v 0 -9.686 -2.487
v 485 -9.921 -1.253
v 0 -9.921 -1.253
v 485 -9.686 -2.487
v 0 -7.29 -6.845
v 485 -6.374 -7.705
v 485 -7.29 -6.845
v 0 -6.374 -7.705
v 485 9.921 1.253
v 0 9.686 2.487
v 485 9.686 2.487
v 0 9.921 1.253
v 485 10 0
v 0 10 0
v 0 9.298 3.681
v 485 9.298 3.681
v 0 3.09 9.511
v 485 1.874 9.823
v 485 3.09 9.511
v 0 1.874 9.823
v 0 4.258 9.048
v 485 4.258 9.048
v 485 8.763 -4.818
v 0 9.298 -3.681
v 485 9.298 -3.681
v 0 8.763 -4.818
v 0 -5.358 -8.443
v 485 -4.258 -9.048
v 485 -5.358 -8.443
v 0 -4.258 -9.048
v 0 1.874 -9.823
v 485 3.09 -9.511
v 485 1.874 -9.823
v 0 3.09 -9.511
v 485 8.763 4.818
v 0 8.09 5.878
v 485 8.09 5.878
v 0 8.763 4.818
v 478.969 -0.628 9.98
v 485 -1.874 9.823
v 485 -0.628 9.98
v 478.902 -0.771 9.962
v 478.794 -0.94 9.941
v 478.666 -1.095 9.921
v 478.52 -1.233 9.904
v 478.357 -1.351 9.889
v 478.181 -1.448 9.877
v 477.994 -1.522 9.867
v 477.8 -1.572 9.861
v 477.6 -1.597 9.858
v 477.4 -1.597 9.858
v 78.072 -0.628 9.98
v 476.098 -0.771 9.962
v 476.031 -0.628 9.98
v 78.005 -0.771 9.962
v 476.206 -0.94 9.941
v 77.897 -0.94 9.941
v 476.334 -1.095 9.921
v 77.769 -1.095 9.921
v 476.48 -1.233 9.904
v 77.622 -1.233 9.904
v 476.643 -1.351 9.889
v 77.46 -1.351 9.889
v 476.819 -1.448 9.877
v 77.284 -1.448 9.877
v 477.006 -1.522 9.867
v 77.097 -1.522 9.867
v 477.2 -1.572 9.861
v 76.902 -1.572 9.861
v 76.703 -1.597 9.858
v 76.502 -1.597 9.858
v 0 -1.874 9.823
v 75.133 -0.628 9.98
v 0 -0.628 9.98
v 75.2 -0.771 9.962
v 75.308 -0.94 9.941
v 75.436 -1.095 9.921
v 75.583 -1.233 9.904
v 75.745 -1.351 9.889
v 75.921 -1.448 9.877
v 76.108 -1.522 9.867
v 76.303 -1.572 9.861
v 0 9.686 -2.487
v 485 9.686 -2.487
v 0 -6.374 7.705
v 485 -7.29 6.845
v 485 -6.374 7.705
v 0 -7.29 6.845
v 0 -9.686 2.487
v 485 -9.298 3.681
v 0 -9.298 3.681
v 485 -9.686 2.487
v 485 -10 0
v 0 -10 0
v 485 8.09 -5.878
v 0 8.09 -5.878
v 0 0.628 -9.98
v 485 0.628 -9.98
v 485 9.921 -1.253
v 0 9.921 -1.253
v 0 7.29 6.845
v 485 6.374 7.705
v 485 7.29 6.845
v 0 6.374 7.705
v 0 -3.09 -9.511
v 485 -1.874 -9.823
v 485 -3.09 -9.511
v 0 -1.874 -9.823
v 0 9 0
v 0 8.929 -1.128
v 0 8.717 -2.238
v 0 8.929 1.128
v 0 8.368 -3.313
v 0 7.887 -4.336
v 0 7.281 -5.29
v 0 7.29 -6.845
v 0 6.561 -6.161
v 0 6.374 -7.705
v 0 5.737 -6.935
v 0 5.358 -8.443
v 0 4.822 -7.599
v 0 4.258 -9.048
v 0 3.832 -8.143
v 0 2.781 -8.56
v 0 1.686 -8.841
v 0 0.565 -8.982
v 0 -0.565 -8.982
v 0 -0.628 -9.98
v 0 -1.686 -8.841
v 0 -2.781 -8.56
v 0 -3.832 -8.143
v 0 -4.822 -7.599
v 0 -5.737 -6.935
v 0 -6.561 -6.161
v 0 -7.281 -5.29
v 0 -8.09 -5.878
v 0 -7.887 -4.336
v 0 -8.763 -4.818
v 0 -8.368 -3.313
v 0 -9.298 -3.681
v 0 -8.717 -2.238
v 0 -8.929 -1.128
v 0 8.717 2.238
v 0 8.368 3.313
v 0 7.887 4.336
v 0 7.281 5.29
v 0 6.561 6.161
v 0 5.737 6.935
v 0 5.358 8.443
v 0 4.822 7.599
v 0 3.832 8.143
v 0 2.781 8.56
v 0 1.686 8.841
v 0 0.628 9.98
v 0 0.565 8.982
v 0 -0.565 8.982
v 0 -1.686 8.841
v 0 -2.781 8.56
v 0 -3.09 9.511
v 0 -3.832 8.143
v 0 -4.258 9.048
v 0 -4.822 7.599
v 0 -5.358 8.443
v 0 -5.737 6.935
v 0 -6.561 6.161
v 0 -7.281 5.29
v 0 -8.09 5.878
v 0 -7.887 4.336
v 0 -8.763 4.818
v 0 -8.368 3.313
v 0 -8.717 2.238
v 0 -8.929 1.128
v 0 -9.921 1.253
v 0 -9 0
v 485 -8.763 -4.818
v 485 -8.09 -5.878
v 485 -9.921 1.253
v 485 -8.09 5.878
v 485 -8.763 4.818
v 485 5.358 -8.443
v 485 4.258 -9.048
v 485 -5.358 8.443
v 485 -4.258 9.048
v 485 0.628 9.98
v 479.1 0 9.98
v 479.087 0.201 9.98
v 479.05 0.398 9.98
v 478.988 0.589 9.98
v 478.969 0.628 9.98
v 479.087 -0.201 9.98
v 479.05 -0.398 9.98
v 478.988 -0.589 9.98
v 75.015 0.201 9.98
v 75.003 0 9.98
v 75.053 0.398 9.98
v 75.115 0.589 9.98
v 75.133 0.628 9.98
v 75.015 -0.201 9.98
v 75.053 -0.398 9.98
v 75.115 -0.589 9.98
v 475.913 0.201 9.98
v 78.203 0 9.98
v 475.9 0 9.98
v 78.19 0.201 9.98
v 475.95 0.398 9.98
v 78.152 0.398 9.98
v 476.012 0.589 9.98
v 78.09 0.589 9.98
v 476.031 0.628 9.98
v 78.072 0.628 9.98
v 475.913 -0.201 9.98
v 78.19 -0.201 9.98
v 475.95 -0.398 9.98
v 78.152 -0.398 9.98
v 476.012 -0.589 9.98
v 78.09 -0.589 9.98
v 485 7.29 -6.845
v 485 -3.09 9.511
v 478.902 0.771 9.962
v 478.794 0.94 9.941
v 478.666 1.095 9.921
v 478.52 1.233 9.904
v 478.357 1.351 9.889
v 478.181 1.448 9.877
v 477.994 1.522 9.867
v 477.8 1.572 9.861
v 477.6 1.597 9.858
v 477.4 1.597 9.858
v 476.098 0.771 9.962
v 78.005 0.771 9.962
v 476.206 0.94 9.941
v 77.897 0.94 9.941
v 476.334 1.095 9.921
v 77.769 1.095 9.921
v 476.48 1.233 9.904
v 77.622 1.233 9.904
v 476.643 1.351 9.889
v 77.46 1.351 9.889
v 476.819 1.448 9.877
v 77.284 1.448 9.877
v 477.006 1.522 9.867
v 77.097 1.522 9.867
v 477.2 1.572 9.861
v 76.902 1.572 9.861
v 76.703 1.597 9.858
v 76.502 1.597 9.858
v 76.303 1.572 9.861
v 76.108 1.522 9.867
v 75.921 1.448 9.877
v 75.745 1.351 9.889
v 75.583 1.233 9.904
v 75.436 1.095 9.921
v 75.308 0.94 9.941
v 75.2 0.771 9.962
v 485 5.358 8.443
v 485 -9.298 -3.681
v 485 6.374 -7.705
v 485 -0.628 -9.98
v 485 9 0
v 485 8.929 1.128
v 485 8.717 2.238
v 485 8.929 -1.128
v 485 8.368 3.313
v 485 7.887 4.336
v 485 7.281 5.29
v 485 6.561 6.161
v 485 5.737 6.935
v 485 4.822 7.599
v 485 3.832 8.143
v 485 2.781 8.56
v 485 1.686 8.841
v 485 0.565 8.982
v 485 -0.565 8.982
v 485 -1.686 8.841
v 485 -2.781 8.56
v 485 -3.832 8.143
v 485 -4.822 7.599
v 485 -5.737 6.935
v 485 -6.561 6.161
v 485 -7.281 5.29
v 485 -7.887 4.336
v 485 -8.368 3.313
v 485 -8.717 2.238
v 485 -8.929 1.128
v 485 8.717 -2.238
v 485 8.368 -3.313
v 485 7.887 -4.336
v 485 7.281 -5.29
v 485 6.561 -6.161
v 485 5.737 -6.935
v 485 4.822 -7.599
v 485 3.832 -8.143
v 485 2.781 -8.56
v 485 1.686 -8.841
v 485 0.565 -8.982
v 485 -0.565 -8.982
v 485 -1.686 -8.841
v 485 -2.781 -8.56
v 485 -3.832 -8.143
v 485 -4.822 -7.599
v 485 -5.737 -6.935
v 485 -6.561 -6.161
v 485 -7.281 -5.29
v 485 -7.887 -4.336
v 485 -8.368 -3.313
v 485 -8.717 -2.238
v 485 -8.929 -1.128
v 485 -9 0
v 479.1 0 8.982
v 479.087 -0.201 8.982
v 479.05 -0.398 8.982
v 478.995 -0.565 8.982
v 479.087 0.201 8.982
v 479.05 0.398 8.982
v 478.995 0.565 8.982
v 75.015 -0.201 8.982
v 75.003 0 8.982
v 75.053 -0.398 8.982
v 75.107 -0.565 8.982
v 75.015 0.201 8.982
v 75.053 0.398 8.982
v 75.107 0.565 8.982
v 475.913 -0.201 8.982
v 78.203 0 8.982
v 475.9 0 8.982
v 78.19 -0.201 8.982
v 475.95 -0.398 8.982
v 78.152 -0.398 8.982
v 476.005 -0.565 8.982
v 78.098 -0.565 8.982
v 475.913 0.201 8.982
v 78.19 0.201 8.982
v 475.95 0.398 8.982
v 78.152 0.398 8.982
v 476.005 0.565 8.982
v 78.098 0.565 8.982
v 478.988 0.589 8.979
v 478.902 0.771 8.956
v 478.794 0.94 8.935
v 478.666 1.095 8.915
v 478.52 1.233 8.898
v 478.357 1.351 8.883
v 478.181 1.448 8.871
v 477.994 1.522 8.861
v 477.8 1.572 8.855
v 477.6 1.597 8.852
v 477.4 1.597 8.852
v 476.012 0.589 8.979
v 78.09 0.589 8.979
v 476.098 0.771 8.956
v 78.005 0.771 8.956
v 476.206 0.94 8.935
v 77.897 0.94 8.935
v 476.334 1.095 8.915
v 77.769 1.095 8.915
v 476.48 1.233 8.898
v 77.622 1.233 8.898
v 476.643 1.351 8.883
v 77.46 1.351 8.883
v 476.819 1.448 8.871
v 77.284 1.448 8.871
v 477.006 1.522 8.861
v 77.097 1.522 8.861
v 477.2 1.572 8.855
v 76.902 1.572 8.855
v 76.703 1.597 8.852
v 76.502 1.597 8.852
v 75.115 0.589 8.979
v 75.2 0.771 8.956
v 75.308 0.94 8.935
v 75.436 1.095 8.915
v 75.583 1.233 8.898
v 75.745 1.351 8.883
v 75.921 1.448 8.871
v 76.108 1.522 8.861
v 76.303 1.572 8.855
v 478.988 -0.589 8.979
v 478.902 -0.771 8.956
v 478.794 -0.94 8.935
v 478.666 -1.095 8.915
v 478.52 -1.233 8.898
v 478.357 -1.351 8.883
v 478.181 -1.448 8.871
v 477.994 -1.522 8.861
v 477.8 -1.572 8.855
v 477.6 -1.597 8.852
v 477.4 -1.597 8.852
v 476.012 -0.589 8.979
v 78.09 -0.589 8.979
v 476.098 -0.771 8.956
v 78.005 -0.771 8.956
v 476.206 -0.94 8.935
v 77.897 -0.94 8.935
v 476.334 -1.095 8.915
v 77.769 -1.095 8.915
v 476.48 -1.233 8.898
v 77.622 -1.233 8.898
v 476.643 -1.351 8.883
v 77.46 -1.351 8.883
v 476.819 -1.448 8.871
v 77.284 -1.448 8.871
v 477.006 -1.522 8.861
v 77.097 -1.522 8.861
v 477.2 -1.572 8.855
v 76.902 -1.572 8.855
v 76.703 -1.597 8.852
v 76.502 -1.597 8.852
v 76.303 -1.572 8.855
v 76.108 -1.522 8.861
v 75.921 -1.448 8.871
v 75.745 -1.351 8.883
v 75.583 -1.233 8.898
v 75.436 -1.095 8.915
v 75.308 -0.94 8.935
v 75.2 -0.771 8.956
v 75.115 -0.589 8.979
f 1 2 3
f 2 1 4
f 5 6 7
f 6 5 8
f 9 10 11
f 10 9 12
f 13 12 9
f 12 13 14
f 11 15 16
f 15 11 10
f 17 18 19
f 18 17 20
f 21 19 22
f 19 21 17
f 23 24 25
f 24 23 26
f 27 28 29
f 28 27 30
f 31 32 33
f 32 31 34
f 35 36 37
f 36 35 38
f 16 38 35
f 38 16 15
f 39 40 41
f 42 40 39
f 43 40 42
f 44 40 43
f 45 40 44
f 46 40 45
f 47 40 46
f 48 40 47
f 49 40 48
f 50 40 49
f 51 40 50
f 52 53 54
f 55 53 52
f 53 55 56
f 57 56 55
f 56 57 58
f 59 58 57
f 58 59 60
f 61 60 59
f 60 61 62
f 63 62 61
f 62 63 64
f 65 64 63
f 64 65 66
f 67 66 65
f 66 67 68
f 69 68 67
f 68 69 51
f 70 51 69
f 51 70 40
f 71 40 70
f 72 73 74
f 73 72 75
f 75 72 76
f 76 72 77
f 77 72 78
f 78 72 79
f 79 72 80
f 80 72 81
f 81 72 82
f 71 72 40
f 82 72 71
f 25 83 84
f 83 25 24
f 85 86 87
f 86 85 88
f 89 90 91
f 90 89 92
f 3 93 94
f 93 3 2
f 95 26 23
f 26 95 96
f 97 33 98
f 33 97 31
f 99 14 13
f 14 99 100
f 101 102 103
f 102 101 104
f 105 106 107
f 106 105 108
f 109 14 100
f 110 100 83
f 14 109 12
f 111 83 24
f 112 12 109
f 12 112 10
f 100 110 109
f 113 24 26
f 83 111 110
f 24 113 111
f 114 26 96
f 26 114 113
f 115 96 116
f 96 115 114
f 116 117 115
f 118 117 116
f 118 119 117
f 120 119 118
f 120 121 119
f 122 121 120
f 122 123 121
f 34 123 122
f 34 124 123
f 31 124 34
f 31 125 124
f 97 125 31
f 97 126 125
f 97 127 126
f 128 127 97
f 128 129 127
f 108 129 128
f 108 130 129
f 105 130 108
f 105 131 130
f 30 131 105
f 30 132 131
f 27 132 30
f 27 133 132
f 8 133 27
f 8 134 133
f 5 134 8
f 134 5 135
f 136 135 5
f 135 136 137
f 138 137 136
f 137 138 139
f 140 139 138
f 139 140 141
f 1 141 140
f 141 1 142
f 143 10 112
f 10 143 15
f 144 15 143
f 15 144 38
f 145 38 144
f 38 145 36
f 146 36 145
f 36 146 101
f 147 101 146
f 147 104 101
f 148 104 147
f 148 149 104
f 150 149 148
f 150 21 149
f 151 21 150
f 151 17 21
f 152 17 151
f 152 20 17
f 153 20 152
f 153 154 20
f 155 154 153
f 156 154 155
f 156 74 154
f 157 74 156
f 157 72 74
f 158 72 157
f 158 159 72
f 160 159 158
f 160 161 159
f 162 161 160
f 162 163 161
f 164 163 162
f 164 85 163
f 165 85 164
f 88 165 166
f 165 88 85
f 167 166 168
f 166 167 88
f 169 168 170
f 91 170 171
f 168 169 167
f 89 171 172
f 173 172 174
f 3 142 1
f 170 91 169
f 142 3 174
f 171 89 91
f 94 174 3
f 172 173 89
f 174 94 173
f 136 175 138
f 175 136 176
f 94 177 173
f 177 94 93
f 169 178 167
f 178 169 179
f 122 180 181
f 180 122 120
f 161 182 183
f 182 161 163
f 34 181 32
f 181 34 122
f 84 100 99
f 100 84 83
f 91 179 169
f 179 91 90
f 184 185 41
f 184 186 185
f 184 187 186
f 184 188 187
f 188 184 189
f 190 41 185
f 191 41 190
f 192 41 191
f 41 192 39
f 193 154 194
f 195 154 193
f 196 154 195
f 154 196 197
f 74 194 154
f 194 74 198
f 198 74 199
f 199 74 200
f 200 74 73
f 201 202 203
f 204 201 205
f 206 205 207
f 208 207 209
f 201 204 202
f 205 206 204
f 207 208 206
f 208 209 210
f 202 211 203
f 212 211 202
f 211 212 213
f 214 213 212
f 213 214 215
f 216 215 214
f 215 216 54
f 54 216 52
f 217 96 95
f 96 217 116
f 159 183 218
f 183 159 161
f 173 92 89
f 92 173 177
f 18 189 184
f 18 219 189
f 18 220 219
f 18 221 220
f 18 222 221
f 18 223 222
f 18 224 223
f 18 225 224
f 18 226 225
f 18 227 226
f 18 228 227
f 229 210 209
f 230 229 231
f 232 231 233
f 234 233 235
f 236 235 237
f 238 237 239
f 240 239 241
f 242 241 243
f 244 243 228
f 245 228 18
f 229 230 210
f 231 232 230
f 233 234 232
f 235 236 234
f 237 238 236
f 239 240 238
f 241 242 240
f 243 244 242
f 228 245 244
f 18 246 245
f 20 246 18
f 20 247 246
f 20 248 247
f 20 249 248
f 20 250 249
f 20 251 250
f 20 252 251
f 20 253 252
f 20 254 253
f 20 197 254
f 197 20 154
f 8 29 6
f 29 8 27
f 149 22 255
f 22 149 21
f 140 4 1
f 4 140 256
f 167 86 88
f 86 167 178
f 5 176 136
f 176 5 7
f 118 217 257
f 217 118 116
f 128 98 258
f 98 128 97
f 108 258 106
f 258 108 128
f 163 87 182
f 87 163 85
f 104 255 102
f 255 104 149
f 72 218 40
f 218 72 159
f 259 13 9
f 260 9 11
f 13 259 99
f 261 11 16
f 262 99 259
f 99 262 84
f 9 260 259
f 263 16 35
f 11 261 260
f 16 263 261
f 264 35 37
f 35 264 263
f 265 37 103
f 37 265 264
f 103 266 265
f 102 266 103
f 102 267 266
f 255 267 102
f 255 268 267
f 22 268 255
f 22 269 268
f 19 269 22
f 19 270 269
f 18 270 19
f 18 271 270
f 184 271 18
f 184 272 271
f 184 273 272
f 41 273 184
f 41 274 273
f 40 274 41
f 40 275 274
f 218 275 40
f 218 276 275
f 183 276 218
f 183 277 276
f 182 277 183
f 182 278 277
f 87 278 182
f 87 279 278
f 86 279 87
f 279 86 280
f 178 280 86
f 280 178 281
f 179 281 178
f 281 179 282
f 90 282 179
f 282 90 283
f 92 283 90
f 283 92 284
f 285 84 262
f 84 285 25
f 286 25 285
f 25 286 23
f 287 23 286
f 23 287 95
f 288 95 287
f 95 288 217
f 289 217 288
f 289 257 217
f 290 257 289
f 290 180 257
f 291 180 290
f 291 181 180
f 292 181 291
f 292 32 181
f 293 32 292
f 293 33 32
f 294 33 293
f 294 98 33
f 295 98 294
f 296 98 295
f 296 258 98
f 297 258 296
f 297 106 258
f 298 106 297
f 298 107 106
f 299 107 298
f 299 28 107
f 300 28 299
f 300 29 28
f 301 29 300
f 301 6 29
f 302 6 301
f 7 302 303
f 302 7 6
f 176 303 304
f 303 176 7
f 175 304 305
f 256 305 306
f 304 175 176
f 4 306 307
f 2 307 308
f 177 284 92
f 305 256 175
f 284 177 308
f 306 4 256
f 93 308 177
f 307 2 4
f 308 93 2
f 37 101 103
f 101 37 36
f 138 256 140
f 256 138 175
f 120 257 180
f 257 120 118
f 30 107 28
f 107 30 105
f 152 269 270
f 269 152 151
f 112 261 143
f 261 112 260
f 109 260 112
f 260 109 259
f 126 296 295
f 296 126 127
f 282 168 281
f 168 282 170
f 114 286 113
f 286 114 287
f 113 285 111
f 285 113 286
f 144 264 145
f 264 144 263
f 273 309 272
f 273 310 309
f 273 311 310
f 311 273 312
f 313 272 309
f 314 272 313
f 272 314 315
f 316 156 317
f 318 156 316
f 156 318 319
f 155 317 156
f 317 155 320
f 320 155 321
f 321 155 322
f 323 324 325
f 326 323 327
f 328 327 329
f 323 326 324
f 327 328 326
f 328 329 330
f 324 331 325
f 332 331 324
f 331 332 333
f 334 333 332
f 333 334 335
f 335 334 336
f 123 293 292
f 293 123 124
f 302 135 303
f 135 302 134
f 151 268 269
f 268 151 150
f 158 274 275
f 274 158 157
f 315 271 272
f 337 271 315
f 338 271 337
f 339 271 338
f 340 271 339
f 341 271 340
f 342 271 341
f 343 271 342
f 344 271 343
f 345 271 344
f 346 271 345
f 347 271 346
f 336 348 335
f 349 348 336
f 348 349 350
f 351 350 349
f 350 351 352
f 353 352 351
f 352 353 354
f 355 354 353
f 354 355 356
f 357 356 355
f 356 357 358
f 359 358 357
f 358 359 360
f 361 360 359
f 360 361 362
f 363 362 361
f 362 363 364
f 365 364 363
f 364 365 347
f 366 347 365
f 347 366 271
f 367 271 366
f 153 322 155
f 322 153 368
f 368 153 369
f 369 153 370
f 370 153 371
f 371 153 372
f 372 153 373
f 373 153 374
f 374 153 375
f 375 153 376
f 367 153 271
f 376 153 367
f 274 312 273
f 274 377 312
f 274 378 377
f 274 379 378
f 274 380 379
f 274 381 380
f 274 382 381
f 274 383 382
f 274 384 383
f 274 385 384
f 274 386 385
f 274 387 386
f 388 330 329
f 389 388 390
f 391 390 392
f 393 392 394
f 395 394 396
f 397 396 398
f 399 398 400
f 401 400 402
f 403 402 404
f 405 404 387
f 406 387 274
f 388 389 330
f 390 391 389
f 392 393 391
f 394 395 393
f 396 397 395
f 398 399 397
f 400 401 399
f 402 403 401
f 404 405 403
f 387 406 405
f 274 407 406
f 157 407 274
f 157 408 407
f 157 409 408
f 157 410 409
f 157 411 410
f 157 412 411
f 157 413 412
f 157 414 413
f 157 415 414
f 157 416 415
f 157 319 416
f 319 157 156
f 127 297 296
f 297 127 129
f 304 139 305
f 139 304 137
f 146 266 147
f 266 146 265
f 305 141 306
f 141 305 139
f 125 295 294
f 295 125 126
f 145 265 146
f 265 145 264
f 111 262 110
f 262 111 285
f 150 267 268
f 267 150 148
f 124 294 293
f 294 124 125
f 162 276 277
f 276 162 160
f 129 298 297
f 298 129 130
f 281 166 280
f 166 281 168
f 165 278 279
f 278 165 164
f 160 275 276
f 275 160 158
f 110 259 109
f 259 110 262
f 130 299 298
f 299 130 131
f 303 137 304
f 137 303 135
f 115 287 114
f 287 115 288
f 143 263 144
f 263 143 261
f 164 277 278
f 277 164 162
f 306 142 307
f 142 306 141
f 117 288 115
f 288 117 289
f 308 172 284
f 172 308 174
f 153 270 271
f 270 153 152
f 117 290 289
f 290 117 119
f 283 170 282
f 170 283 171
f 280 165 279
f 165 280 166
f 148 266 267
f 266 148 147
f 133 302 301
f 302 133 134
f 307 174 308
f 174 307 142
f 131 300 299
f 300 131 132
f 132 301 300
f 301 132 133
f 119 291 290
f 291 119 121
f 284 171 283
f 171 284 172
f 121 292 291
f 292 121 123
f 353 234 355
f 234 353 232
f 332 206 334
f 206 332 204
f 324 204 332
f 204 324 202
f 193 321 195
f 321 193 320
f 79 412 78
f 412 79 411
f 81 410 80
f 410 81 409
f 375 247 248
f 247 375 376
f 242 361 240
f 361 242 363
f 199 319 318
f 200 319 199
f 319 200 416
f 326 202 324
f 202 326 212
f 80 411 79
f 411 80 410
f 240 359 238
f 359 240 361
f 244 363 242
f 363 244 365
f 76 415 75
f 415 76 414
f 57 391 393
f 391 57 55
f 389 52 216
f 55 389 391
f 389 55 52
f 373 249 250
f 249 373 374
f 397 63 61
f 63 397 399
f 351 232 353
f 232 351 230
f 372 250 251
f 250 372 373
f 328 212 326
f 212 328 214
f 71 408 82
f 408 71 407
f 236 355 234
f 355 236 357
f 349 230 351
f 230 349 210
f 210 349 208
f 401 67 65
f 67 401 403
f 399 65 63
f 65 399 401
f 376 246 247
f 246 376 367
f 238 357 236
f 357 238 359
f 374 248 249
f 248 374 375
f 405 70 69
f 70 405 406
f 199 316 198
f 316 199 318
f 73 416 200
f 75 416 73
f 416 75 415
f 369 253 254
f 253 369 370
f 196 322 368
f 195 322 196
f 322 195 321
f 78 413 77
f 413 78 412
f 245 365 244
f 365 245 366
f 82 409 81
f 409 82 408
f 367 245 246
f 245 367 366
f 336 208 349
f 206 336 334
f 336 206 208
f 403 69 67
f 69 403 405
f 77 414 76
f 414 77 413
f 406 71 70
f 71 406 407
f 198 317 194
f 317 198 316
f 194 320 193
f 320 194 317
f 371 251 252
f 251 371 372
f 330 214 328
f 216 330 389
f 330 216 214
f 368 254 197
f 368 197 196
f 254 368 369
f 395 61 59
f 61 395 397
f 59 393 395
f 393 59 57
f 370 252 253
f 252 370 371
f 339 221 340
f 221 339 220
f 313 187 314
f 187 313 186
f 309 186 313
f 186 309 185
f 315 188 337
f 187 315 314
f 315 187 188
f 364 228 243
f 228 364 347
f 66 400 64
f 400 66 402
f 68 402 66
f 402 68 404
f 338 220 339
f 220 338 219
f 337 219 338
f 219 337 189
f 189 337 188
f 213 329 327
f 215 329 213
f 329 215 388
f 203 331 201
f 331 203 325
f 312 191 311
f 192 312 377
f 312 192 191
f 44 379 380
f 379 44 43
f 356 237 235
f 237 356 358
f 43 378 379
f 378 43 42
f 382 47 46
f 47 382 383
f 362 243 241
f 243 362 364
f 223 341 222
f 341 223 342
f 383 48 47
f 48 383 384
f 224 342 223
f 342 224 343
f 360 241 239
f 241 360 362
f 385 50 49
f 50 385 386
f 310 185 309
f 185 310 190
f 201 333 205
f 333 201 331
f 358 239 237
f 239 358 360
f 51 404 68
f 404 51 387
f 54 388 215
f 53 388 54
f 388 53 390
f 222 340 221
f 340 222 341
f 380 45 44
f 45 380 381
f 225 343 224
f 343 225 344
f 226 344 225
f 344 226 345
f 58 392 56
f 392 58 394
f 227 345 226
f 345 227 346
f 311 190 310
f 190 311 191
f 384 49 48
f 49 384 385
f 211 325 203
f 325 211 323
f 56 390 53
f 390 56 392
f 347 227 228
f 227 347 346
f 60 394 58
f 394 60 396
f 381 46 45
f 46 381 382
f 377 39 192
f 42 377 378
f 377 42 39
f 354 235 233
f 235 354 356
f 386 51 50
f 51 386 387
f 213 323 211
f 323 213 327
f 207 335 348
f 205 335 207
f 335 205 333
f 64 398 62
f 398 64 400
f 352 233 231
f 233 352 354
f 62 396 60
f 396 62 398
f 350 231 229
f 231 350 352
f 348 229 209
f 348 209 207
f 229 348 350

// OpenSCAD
// file: parameters.scad
arm_n = 6;
rotor_diameter = 250;
drone_diameter = (rotor_diameter/sin(180/arm_n));

global_clearence = 0.1;


// M3 parameters =========================================
M3_screw_diameter = 3.2;
M3_nut_height = 2.7;
M3_nut_diameter = 6.6;
M3_nut_pocket = 5.6;

// 3D printer para. ======================================
print_plate_x = 220;
print_plate_y = 220;


// motor parameters ======================================
motor_diameter = 40;
motor_height = 18;
motor_n_screws = 4;
motor_screws_diameter = 20;


// motor holder para. (666_1001) =========================
motor_plate_height = 7;
motor_plate_diameter = motor_diameter;
motor_plate_hole_diameter = 10;
motor_tube_x_offset = motor_diameter/2 - 5;
motor_tube_z_offset = 20;

screws_n = 2;
screws_gap = 15;
screws_offset_x = 7.5;
screws_offset_y = 5;
holding_part_x = 30;
upper_holding_part_height = 15;
washer_size_x = 10;


// avionics plate para. (666_1003) =======================
avionics_plate_diameter = 200;
avionics_plate_height = 3;
avionics_plate_z_offset = 25;

av_screws_diameter = 160;
av_cable_holes_offset = 70;
av_cable_holes_width = 8;
av_cable_holes_length = 20;


// main base para. (666_1004) ============================
base_diameter = 200;
base_height = 30;
base_bottom_height = base_height/2;
base_arm_screw_x_offset = 5;

base_low_diameter = base_diameter/(2*tan(180/arm_n));
base_arm_washer_width = 10;


// arm pipe para. (888_1002) =============================
arm_pipe_diameter = 20;
arm_pipe_inner_diameter = 18;
arm_pipe_x_offset = 0;
arm_pipe_z_offset = 5;
arm_pipe_length = drone_diameter-motor_tube_x_offset-arm_pipe_x_offset;
// main file
include <parameters.scad>;

module 888_1002(draft) {
    difference() {
        rotate([90,0,90])
        union() {
            difference() {
                cylinder(arm_pipe_length, d=arm_pipe_diameter, $fn = draft ? 10 : 50);
                translate([0,0,-1])
                cylinder(arm_pipe_length+2, d=arm_pipe_inner_diameter, $fn = draft ? 10 : 50);
            } 
        }
        
    translate([base_low_diameter/2-base_arm_screw_x_offset-base_arm_screw_x_offset,0,0])
    cylinder(arm_pipe_diameter, d=M3_screw_diameter, $fn = draft ? 10 : 50);   
        
    translate([arm_pipe_length-screws_offset_x,0,0])
    cylinder(arm_pipe_diameter, d=M3_screw_diameter, $fn = draft ? 10 : 50);   
    }
        
}

888_1002();
